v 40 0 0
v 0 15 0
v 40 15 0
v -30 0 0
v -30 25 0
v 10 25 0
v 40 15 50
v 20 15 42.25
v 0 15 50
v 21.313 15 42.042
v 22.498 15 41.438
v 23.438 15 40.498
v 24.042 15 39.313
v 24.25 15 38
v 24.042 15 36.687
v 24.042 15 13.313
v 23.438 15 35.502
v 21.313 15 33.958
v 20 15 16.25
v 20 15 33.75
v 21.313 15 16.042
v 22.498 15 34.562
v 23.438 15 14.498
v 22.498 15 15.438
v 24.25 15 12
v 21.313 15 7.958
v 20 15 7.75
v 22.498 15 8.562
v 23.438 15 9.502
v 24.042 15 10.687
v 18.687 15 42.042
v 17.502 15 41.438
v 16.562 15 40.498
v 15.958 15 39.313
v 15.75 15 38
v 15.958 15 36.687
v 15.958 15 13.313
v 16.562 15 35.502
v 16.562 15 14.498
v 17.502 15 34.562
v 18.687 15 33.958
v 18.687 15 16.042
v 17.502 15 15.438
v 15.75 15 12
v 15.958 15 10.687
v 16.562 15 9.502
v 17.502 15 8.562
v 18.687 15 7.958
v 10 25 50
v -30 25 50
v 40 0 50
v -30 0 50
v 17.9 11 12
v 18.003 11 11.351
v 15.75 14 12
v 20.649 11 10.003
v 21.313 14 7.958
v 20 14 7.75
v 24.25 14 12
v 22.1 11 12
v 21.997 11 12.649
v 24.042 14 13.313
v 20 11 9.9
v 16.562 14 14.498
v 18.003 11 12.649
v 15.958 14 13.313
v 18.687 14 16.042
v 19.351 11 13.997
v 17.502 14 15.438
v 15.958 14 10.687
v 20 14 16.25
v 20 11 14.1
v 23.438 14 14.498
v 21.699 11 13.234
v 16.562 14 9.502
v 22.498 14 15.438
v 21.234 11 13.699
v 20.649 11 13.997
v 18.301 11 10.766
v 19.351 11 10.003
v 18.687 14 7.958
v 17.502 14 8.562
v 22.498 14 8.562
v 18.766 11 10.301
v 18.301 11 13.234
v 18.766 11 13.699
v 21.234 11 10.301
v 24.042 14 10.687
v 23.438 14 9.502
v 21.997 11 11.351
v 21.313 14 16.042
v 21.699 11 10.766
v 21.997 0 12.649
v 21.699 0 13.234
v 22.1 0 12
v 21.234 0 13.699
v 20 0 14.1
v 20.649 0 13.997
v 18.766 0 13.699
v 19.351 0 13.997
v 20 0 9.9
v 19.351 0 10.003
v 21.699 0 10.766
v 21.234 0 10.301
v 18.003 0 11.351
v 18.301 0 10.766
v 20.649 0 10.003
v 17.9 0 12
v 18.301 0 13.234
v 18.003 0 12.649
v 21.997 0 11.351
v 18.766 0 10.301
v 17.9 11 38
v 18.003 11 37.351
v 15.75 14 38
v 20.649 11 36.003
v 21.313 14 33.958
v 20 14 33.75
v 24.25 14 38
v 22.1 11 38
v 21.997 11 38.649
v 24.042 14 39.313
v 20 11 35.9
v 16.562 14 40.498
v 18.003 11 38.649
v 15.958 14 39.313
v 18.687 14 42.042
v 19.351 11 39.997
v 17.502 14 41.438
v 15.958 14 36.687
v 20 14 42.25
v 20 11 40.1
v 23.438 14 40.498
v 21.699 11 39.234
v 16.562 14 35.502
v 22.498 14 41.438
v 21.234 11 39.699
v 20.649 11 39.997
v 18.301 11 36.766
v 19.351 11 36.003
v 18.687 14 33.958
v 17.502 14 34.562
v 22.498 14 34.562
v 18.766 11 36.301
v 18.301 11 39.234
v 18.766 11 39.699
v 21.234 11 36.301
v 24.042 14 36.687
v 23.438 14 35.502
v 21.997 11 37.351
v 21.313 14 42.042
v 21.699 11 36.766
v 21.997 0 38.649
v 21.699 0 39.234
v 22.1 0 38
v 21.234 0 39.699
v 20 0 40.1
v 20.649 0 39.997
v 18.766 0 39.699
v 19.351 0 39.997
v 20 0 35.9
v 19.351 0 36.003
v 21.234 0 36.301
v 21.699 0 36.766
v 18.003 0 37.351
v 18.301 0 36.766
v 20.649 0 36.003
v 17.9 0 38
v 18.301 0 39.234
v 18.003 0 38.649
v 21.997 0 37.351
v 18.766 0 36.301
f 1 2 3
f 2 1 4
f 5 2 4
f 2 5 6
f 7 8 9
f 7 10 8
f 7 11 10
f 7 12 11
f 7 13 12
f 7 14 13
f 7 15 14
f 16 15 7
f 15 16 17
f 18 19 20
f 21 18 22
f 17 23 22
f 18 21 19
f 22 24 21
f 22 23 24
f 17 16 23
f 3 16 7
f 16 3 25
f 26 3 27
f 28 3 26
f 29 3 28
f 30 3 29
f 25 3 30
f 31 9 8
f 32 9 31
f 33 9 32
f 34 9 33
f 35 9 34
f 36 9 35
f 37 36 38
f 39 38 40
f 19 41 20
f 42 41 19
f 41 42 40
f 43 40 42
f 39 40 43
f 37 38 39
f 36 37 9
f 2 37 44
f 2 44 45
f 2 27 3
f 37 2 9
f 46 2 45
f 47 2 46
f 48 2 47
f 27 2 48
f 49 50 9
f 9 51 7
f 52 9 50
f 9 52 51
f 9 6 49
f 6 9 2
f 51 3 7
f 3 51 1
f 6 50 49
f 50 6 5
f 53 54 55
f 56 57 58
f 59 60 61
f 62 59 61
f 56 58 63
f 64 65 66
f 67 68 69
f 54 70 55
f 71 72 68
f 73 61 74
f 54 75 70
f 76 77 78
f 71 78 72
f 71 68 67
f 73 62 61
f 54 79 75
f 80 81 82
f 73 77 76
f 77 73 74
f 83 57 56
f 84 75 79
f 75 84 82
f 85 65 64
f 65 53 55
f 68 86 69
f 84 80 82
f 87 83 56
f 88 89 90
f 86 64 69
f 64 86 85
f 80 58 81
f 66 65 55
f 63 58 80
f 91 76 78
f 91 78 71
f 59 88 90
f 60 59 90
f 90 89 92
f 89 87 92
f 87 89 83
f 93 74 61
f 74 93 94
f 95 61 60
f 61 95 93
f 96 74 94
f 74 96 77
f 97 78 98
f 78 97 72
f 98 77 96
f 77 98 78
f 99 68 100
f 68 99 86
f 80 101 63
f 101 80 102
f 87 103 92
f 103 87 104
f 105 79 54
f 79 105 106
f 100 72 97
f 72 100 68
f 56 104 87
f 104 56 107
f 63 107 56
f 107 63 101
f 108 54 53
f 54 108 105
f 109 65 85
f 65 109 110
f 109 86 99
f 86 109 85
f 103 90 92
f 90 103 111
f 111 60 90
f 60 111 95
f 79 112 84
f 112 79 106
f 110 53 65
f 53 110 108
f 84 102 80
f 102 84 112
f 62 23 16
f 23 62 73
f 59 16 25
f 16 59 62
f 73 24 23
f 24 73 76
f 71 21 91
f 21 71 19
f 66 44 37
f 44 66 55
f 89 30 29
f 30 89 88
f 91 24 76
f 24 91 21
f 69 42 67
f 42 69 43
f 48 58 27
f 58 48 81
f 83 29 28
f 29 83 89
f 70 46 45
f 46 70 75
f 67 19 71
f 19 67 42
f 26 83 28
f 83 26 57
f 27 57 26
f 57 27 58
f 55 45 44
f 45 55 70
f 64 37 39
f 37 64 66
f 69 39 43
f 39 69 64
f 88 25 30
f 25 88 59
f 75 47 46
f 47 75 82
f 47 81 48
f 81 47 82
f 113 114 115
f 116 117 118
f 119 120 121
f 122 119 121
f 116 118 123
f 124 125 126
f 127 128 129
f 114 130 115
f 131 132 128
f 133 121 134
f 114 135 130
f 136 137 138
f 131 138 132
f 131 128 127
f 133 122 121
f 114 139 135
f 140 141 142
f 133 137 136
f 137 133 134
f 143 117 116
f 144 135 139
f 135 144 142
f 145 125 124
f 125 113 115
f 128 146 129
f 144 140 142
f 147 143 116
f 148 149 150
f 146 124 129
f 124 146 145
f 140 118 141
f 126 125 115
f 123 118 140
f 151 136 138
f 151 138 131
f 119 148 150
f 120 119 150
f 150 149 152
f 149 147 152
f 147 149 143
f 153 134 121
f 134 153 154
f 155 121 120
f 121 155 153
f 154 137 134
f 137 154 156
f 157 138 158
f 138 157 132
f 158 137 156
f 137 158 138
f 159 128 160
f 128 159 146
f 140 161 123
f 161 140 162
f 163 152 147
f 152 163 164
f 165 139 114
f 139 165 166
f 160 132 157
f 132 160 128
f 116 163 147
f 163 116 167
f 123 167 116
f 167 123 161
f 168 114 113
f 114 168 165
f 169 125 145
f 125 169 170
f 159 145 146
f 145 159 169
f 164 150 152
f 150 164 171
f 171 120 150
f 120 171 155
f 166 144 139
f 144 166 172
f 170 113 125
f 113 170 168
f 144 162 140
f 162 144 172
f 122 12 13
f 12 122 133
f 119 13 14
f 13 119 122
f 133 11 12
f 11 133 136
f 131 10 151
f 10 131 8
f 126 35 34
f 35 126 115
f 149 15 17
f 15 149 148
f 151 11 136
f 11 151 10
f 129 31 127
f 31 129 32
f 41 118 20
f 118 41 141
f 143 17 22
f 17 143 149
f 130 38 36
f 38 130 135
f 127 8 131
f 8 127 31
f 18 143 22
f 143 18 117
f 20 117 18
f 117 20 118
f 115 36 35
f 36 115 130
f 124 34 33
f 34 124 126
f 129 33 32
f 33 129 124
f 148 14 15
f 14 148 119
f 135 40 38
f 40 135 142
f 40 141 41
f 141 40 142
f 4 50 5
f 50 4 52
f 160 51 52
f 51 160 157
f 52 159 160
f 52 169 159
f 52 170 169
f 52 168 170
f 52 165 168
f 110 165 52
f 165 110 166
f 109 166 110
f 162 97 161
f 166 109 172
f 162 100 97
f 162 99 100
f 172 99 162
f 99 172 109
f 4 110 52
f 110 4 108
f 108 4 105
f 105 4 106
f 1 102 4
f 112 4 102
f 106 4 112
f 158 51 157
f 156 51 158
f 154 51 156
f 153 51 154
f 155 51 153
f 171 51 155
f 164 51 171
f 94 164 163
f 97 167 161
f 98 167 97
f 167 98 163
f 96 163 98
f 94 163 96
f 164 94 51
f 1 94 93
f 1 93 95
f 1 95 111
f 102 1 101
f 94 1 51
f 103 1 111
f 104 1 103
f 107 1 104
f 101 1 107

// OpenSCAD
mount_edge = 10;
mount_length = 50;

part_b_overhead_x = 30;
part_b_overhead_y = 15;

sface_h = 30;

n_screws = 2;
screw_offset = 12;

module screw_countersunk(
        l=20,   //length
        dh = 8.5,   //head dia
        lh = 3.0,   //head length
        ds = 4.2,  //shaft dia
        rec = 2,
        $fn=20,
        )
{
        translate([0, 0, rec]) {
          cylinder(h=lh, r1=dh/2, r2=ds/2);
          cylinder(h=l, d=ds);
        }
        cylinder(h=rec, d=dh);
}

module part_a_no_holes() {
    linear_extrude(mount_length)
  polygon([[0,0],[mount_edge,mount_edge],[mount_edge,0]]);
  
    translate([mount_edge, 0, 0]) cube([sface_h, mount_edge, mount_length]);

}
module part_a() {
difference() {
    part_a_no_holes();
z_off = mount_length - 2 * screw_offset;
for(a = [0:n_screws-1])   
  translate([0.5*(sface_h+mount_edge), 0, screw_offset + a * z_off / (n_screws - 1)]) rotate([-90, 0, 0]) screw_countersunk();
}
}

module part_b() {
difference() {
  translate([-part_b_overhead_x, 0, 0])
    cube([sface_h+mount_edge+part_b_overhead_x, mount_edge+part_b_overhead_y, mount_length]);
  translate([0, part_b_overhead_y, 0]) part_a_no_holes();

    z_off = mount_length - 2 * screw_offset;
for(a = [0:n_screws-1])   
  translate([0.5*(sface_h+mount_edge), part_b_overhead_y+1, screw_offset + a * z_off / (n_screws - 1)]) rotate([90, 0, 0]) screw_countersunk();
}
}

part_b();
